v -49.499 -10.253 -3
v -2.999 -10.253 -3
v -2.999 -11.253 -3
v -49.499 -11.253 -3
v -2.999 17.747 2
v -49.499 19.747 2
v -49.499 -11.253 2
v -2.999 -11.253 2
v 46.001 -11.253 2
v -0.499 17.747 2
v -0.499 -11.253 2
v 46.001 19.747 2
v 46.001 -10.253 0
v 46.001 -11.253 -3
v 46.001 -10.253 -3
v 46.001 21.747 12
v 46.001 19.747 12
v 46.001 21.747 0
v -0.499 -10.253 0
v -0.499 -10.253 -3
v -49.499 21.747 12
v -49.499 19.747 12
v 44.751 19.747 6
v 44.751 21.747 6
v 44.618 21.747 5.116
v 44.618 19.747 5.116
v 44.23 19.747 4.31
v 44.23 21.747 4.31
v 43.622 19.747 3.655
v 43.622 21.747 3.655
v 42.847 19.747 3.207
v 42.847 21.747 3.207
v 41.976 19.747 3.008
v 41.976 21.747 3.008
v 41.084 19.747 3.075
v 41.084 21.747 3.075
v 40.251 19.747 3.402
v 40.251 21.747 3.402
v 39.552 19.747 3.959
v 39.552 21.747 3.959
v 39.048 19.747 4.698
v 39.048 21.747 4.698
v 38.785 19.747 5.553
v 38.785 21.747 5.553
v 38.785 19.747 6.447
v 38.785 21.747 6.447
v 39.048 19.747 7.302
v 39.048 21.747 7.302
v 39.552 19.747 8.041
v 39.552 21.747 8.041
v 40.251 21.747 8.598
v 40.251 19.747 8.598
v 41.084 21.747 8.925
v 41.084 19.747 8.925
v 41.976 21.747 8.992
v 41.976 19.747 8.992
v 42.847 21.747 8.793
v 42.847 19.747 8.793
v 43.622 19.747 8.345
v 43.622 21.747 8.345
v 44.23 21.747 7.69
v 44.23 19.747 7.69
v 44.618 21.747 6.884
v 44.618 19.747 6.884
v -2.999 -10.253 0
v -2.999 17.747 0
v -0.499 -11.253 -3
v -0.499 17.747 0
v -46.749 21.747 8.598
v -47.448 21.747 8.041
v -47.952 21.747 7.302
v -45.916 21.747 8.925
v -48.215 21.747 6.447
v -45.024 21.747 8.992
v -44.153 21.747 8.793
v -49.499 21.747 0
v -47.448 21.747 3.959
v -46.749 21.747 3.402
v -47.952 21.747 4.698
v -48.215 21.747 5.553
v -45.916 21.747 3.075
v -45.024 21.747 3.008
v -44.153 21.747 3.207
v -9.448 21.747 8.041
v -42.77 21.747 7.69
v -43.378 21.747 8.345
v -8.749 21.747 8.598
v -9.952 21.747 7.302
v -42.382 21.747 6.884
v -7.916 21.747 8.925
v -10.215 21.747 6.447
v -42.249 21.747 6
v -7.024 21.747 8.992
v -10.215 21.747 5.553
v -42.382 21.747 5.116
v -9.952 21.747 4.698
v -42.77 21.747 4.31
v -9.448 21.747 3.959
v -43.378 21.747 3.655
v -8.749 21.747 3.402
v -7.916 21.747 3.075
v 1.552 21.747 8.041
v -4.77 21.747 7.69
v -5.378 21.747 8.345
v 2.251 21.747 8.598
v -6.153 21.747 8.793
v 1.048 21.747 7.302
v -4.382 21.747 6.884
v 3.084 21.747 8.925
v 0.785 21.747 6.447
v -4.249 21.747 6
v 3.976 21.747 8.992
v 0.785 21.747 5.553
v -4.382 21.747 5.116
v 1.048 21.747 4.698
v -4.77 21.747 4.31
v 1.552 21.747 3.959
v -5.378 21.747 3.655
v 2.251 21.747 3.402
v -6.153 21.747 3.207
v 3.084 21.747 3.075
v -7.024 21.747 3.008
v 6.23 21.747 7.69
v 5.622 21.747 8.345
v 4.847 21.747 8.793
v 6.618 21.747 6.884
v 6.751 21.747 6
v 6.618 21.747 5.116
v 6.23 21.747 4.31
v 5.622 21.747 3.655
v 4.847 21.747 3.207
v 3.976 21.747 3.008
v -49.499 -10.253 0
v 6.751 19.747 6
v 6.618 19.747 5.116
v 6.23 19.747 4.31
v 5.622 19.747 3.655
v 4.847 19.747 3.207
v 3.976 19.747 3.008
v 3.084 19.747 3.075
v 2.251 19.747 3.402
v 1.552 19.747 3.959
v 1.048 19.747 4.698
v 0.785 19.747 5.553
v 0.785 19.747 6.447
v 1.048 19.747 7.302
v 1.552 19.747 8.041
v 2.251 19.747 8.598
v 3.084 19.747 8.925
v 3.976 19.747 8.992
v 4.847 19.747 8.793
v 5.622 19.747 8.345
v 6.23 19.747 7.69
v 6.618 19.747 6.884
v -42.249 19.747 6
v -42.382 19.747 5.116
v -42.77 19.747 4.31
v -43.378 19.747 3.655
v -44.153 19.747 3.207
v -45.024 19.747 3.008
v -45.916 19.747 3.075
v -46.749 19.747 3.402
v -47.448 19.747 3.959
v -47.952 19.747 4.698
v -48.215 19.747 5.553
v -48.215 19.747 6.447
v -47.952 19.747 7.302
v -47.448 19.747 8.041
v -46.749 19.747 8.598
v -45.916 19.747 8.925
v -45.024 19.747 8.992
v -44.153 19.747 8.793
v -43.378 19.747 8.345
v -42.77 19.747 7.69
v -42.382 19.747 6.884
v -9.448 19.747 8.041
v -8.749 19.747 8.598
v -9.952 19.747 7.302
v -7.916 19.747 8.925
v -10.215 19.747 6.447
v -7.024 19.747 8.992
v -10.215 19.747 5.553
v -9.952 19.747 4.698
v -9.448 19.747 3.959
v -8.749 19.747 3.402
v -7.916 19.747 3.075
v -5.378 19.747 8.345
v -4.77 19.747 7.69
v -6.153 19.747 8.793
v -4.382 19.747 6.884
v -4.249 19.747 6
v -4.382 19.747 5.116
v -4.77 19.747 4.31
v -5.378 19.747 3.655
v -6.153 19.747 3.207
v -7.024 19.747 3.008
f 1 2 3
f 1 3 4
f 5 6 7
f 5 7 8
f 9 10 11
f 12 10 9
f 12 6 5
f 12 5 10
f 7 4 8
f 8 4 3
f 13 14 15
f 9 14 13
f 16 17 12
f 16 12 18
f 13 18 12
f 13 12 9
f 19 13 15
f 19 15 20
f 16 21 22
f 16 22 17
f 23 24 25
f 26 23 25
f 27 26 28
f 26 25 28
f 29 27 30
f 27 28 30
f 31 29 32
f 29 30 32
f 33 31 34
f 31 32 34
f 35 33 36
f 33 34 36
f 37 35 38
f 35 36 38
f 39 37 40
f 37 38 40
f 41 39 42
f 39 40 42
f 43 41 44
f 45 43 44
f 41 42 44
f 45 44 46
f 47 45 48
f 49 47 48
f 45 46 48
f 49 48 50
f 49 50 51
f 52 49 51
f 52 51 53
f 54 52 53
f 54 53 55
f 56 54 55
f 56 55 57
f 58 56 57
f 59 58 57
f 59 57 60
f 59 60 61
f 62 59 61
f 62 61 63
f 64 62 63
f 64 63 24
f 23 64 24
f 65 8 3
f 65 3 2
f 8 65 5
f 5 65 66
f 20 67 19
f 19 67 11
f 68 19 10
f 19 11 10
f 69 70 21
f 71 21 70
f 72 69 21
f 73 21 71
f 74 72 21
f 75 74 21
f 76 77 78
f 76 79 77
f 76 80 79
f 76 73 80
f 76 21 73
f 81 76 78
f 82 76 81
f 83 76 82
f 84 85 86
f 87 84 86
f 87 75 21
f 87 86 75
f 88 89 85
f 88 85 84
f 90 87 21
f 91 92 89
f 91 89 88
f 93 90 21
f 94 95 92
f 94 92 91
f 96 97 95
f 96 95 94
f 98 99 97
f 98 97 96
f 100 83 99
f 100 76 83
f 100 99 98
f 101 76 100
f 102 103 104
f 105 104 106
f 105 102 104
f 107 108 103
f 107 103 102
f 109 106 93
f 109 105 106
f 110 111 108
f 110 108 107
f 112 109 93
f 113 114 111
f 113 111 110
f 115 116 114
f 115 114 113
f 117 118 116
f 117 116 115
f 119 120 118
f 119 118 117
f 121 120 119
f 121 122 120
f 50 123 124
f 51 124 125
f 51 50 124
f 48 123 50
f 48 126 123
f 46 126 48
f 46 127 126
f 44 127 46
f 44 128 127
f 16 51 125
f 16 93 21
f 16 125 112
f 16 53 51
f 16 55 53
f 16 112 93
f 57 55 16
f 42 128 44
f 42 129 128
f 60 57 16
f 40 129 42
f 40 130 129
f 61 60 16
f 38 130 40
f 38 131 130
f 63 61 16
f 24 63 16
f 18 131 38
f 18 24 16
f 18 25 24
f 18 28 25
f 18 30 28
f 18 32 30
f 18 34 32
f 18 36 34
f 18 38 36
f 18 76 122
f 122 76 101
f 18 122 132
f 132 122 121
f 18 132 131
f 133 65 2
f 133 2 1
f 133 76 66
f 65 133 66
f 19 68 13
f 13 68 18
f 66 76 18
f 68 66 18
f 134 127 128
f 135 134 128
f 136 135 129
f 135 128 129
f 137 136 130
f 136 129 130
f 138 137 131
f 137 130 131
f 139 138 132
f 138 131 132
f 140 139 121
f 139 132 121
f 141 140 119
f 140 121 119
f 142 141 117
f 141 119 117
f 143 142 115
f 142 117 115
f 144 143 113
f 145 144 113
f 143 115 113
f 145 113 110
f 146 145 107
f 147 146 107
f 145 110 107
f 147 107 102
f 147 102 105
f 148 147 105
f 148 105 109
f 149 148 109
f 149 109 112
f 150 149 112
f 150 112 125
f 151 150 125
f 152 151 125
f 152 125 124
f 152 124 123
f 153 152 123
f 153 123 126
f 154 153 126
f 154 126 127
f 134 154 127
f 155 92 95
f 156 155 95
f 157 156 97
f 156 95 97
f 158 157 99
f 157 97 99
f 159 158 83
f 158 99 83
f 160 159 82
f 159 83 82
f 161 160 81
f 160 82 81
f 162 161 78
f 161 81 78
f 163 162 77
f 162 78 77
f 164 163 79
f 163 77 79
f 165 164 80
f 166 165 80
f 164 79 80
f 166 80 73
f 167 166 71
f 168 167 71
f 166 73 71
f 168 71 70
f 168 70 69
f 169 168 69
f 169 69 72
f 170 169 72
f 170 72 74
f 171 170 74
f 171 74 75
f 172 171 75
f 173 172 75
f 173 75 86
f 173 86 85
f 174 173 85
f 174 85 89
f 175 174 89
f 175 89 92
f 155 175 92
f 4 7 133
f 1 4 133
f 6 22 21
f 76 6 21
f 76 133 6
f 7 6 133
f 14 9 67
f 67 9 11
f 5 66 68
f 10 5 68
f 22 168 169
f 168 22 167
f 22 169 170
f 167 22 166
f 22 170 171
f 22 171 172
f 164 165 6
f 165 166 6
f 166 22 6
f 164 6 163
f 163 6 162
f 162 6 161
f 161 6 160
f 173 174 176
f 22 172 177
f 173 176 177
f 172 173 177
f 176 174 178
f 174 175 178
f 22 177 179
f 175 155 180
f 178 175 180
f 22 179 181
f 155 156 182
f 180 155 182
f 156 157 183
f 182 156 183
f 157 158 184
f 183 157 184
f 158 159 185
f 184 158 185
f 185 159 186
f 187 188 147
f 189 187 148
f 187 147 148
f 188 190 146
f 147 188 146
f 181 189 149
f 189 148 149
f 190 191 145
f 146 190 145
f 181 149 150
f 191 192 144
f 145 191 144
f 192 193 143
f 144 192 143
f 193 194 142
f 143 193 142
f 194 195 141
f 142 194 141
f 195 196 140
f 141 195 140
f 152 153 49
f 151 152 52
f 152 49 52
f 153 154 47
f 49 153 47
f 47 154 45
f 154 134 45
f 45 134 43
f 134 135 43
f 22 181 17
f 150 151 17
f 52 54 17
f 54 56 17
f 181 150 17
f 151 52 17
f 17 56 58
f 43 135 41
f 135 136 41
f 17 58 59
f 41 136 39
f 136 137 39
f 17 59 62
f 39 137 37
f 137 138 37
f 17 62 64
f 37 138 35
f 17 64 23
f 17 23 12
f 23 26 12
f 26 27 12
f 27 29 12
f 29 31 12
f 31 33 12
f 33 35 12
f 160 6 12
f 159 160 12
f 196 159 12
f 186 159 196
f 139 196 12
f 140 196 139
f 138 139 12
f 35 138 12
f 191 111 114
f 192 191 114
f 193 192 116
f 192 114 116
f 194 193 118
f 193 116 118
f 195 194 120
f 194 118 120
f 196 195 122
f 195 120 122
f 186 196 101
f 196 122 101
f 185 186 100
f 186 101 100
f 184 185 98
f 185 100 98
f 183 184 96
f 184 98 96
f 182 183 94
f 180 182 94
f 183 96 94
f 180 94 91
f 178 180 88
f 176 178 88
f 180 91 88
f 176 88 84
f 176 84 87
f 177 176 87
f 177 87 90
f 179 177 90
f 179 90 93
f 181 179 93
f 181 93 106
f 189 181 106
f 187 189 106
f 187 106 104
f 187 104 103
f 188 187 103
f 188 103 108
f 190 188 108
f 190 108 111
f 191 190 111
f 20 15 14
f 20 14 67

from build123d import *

# Parameters (mm, degrees)
BOSS_EXTRUDE1_DEPTH = 2
SKETCH2_W           = 95.5
SKETCH2_H           = 2
BOSS_EXTRUDE2_DEPTH = 10
SKETCH3_R           = 3
CUT_EXTRUDE1_DEPTH  = 34
SKETCH4_W           = 46.5
SKETCH4_H           = 1
BOSS_EXTRUDE3_DEPTH = 3


with BuildPart() as part:
    # Sketch1 → Boss-Extrude1 (new body)
    with BuildSketch(Plane.XY):
        Polygon((-2.998624877, 17.747280284), (-0.498624877, 17.747280284), (-0.498624877, -11.252719716), (46.001375123, -11.252719716), (46.001375123, 21.747280284), (-49.498624877, 21.747280284), (-49.498624877, -11.252719716), (-2.998624877, -11.252719716), align=None)
    extrude(amount=BOSS_EXTRUDE1_DEPTH)

    # Sketch2 → Boss-Extrude2 (add)
    with BuildSketch(Plane.XY.offset(2)):
        with Locations((-1.748624877, 20.747280284)):
            Rectangle(SKETCH2_W, SKETCH2_H)
    extrude(amount=BOSS_EXTRUDE2_DEPTH)

    # Sketch3 → Cut-Extrude1 (cut, through all)
    with BuildSketch(Plane(origin=(0, 21.747280284, 0), x_dir=(1, 0, 0), z_dir=(0, 1, 0))):
        with Locations((-45.248624877, -6)):
            Circle(SKETCH3_R)
        with Locations((-7.248624877, -6)):
            Circle(SKETCH3_R)
        with Locations((3.751375123, -6)):
            Circle(SKETCH3_R)
        with Locations((41.751375123, -6)):
            Circle(SKETCH3_R)
    extrude(amount=-CUT_EXTRUDE1_DEPTH, mode=Mode.SUBTRACT)

    # Sketch4 → Boss-Extrude3 (add)
    with BuildSketch(Plane(origin=(0, 0, 0), x_dir=(-1, 0, 0), z_dir=(0, 0, -1))):
        with Locations((-22.751375123, -10.752719716)):
            Rectangle(SKETCH4_W, SKETCH4_H)
        with Locations((26.248624877, -10.752719716)):
            Rectangle(SKETCH4_W, SKETCH4_H)
    extrude(amount=BOSS_EXTRUDE3_DEPTH)


solid = part.part
